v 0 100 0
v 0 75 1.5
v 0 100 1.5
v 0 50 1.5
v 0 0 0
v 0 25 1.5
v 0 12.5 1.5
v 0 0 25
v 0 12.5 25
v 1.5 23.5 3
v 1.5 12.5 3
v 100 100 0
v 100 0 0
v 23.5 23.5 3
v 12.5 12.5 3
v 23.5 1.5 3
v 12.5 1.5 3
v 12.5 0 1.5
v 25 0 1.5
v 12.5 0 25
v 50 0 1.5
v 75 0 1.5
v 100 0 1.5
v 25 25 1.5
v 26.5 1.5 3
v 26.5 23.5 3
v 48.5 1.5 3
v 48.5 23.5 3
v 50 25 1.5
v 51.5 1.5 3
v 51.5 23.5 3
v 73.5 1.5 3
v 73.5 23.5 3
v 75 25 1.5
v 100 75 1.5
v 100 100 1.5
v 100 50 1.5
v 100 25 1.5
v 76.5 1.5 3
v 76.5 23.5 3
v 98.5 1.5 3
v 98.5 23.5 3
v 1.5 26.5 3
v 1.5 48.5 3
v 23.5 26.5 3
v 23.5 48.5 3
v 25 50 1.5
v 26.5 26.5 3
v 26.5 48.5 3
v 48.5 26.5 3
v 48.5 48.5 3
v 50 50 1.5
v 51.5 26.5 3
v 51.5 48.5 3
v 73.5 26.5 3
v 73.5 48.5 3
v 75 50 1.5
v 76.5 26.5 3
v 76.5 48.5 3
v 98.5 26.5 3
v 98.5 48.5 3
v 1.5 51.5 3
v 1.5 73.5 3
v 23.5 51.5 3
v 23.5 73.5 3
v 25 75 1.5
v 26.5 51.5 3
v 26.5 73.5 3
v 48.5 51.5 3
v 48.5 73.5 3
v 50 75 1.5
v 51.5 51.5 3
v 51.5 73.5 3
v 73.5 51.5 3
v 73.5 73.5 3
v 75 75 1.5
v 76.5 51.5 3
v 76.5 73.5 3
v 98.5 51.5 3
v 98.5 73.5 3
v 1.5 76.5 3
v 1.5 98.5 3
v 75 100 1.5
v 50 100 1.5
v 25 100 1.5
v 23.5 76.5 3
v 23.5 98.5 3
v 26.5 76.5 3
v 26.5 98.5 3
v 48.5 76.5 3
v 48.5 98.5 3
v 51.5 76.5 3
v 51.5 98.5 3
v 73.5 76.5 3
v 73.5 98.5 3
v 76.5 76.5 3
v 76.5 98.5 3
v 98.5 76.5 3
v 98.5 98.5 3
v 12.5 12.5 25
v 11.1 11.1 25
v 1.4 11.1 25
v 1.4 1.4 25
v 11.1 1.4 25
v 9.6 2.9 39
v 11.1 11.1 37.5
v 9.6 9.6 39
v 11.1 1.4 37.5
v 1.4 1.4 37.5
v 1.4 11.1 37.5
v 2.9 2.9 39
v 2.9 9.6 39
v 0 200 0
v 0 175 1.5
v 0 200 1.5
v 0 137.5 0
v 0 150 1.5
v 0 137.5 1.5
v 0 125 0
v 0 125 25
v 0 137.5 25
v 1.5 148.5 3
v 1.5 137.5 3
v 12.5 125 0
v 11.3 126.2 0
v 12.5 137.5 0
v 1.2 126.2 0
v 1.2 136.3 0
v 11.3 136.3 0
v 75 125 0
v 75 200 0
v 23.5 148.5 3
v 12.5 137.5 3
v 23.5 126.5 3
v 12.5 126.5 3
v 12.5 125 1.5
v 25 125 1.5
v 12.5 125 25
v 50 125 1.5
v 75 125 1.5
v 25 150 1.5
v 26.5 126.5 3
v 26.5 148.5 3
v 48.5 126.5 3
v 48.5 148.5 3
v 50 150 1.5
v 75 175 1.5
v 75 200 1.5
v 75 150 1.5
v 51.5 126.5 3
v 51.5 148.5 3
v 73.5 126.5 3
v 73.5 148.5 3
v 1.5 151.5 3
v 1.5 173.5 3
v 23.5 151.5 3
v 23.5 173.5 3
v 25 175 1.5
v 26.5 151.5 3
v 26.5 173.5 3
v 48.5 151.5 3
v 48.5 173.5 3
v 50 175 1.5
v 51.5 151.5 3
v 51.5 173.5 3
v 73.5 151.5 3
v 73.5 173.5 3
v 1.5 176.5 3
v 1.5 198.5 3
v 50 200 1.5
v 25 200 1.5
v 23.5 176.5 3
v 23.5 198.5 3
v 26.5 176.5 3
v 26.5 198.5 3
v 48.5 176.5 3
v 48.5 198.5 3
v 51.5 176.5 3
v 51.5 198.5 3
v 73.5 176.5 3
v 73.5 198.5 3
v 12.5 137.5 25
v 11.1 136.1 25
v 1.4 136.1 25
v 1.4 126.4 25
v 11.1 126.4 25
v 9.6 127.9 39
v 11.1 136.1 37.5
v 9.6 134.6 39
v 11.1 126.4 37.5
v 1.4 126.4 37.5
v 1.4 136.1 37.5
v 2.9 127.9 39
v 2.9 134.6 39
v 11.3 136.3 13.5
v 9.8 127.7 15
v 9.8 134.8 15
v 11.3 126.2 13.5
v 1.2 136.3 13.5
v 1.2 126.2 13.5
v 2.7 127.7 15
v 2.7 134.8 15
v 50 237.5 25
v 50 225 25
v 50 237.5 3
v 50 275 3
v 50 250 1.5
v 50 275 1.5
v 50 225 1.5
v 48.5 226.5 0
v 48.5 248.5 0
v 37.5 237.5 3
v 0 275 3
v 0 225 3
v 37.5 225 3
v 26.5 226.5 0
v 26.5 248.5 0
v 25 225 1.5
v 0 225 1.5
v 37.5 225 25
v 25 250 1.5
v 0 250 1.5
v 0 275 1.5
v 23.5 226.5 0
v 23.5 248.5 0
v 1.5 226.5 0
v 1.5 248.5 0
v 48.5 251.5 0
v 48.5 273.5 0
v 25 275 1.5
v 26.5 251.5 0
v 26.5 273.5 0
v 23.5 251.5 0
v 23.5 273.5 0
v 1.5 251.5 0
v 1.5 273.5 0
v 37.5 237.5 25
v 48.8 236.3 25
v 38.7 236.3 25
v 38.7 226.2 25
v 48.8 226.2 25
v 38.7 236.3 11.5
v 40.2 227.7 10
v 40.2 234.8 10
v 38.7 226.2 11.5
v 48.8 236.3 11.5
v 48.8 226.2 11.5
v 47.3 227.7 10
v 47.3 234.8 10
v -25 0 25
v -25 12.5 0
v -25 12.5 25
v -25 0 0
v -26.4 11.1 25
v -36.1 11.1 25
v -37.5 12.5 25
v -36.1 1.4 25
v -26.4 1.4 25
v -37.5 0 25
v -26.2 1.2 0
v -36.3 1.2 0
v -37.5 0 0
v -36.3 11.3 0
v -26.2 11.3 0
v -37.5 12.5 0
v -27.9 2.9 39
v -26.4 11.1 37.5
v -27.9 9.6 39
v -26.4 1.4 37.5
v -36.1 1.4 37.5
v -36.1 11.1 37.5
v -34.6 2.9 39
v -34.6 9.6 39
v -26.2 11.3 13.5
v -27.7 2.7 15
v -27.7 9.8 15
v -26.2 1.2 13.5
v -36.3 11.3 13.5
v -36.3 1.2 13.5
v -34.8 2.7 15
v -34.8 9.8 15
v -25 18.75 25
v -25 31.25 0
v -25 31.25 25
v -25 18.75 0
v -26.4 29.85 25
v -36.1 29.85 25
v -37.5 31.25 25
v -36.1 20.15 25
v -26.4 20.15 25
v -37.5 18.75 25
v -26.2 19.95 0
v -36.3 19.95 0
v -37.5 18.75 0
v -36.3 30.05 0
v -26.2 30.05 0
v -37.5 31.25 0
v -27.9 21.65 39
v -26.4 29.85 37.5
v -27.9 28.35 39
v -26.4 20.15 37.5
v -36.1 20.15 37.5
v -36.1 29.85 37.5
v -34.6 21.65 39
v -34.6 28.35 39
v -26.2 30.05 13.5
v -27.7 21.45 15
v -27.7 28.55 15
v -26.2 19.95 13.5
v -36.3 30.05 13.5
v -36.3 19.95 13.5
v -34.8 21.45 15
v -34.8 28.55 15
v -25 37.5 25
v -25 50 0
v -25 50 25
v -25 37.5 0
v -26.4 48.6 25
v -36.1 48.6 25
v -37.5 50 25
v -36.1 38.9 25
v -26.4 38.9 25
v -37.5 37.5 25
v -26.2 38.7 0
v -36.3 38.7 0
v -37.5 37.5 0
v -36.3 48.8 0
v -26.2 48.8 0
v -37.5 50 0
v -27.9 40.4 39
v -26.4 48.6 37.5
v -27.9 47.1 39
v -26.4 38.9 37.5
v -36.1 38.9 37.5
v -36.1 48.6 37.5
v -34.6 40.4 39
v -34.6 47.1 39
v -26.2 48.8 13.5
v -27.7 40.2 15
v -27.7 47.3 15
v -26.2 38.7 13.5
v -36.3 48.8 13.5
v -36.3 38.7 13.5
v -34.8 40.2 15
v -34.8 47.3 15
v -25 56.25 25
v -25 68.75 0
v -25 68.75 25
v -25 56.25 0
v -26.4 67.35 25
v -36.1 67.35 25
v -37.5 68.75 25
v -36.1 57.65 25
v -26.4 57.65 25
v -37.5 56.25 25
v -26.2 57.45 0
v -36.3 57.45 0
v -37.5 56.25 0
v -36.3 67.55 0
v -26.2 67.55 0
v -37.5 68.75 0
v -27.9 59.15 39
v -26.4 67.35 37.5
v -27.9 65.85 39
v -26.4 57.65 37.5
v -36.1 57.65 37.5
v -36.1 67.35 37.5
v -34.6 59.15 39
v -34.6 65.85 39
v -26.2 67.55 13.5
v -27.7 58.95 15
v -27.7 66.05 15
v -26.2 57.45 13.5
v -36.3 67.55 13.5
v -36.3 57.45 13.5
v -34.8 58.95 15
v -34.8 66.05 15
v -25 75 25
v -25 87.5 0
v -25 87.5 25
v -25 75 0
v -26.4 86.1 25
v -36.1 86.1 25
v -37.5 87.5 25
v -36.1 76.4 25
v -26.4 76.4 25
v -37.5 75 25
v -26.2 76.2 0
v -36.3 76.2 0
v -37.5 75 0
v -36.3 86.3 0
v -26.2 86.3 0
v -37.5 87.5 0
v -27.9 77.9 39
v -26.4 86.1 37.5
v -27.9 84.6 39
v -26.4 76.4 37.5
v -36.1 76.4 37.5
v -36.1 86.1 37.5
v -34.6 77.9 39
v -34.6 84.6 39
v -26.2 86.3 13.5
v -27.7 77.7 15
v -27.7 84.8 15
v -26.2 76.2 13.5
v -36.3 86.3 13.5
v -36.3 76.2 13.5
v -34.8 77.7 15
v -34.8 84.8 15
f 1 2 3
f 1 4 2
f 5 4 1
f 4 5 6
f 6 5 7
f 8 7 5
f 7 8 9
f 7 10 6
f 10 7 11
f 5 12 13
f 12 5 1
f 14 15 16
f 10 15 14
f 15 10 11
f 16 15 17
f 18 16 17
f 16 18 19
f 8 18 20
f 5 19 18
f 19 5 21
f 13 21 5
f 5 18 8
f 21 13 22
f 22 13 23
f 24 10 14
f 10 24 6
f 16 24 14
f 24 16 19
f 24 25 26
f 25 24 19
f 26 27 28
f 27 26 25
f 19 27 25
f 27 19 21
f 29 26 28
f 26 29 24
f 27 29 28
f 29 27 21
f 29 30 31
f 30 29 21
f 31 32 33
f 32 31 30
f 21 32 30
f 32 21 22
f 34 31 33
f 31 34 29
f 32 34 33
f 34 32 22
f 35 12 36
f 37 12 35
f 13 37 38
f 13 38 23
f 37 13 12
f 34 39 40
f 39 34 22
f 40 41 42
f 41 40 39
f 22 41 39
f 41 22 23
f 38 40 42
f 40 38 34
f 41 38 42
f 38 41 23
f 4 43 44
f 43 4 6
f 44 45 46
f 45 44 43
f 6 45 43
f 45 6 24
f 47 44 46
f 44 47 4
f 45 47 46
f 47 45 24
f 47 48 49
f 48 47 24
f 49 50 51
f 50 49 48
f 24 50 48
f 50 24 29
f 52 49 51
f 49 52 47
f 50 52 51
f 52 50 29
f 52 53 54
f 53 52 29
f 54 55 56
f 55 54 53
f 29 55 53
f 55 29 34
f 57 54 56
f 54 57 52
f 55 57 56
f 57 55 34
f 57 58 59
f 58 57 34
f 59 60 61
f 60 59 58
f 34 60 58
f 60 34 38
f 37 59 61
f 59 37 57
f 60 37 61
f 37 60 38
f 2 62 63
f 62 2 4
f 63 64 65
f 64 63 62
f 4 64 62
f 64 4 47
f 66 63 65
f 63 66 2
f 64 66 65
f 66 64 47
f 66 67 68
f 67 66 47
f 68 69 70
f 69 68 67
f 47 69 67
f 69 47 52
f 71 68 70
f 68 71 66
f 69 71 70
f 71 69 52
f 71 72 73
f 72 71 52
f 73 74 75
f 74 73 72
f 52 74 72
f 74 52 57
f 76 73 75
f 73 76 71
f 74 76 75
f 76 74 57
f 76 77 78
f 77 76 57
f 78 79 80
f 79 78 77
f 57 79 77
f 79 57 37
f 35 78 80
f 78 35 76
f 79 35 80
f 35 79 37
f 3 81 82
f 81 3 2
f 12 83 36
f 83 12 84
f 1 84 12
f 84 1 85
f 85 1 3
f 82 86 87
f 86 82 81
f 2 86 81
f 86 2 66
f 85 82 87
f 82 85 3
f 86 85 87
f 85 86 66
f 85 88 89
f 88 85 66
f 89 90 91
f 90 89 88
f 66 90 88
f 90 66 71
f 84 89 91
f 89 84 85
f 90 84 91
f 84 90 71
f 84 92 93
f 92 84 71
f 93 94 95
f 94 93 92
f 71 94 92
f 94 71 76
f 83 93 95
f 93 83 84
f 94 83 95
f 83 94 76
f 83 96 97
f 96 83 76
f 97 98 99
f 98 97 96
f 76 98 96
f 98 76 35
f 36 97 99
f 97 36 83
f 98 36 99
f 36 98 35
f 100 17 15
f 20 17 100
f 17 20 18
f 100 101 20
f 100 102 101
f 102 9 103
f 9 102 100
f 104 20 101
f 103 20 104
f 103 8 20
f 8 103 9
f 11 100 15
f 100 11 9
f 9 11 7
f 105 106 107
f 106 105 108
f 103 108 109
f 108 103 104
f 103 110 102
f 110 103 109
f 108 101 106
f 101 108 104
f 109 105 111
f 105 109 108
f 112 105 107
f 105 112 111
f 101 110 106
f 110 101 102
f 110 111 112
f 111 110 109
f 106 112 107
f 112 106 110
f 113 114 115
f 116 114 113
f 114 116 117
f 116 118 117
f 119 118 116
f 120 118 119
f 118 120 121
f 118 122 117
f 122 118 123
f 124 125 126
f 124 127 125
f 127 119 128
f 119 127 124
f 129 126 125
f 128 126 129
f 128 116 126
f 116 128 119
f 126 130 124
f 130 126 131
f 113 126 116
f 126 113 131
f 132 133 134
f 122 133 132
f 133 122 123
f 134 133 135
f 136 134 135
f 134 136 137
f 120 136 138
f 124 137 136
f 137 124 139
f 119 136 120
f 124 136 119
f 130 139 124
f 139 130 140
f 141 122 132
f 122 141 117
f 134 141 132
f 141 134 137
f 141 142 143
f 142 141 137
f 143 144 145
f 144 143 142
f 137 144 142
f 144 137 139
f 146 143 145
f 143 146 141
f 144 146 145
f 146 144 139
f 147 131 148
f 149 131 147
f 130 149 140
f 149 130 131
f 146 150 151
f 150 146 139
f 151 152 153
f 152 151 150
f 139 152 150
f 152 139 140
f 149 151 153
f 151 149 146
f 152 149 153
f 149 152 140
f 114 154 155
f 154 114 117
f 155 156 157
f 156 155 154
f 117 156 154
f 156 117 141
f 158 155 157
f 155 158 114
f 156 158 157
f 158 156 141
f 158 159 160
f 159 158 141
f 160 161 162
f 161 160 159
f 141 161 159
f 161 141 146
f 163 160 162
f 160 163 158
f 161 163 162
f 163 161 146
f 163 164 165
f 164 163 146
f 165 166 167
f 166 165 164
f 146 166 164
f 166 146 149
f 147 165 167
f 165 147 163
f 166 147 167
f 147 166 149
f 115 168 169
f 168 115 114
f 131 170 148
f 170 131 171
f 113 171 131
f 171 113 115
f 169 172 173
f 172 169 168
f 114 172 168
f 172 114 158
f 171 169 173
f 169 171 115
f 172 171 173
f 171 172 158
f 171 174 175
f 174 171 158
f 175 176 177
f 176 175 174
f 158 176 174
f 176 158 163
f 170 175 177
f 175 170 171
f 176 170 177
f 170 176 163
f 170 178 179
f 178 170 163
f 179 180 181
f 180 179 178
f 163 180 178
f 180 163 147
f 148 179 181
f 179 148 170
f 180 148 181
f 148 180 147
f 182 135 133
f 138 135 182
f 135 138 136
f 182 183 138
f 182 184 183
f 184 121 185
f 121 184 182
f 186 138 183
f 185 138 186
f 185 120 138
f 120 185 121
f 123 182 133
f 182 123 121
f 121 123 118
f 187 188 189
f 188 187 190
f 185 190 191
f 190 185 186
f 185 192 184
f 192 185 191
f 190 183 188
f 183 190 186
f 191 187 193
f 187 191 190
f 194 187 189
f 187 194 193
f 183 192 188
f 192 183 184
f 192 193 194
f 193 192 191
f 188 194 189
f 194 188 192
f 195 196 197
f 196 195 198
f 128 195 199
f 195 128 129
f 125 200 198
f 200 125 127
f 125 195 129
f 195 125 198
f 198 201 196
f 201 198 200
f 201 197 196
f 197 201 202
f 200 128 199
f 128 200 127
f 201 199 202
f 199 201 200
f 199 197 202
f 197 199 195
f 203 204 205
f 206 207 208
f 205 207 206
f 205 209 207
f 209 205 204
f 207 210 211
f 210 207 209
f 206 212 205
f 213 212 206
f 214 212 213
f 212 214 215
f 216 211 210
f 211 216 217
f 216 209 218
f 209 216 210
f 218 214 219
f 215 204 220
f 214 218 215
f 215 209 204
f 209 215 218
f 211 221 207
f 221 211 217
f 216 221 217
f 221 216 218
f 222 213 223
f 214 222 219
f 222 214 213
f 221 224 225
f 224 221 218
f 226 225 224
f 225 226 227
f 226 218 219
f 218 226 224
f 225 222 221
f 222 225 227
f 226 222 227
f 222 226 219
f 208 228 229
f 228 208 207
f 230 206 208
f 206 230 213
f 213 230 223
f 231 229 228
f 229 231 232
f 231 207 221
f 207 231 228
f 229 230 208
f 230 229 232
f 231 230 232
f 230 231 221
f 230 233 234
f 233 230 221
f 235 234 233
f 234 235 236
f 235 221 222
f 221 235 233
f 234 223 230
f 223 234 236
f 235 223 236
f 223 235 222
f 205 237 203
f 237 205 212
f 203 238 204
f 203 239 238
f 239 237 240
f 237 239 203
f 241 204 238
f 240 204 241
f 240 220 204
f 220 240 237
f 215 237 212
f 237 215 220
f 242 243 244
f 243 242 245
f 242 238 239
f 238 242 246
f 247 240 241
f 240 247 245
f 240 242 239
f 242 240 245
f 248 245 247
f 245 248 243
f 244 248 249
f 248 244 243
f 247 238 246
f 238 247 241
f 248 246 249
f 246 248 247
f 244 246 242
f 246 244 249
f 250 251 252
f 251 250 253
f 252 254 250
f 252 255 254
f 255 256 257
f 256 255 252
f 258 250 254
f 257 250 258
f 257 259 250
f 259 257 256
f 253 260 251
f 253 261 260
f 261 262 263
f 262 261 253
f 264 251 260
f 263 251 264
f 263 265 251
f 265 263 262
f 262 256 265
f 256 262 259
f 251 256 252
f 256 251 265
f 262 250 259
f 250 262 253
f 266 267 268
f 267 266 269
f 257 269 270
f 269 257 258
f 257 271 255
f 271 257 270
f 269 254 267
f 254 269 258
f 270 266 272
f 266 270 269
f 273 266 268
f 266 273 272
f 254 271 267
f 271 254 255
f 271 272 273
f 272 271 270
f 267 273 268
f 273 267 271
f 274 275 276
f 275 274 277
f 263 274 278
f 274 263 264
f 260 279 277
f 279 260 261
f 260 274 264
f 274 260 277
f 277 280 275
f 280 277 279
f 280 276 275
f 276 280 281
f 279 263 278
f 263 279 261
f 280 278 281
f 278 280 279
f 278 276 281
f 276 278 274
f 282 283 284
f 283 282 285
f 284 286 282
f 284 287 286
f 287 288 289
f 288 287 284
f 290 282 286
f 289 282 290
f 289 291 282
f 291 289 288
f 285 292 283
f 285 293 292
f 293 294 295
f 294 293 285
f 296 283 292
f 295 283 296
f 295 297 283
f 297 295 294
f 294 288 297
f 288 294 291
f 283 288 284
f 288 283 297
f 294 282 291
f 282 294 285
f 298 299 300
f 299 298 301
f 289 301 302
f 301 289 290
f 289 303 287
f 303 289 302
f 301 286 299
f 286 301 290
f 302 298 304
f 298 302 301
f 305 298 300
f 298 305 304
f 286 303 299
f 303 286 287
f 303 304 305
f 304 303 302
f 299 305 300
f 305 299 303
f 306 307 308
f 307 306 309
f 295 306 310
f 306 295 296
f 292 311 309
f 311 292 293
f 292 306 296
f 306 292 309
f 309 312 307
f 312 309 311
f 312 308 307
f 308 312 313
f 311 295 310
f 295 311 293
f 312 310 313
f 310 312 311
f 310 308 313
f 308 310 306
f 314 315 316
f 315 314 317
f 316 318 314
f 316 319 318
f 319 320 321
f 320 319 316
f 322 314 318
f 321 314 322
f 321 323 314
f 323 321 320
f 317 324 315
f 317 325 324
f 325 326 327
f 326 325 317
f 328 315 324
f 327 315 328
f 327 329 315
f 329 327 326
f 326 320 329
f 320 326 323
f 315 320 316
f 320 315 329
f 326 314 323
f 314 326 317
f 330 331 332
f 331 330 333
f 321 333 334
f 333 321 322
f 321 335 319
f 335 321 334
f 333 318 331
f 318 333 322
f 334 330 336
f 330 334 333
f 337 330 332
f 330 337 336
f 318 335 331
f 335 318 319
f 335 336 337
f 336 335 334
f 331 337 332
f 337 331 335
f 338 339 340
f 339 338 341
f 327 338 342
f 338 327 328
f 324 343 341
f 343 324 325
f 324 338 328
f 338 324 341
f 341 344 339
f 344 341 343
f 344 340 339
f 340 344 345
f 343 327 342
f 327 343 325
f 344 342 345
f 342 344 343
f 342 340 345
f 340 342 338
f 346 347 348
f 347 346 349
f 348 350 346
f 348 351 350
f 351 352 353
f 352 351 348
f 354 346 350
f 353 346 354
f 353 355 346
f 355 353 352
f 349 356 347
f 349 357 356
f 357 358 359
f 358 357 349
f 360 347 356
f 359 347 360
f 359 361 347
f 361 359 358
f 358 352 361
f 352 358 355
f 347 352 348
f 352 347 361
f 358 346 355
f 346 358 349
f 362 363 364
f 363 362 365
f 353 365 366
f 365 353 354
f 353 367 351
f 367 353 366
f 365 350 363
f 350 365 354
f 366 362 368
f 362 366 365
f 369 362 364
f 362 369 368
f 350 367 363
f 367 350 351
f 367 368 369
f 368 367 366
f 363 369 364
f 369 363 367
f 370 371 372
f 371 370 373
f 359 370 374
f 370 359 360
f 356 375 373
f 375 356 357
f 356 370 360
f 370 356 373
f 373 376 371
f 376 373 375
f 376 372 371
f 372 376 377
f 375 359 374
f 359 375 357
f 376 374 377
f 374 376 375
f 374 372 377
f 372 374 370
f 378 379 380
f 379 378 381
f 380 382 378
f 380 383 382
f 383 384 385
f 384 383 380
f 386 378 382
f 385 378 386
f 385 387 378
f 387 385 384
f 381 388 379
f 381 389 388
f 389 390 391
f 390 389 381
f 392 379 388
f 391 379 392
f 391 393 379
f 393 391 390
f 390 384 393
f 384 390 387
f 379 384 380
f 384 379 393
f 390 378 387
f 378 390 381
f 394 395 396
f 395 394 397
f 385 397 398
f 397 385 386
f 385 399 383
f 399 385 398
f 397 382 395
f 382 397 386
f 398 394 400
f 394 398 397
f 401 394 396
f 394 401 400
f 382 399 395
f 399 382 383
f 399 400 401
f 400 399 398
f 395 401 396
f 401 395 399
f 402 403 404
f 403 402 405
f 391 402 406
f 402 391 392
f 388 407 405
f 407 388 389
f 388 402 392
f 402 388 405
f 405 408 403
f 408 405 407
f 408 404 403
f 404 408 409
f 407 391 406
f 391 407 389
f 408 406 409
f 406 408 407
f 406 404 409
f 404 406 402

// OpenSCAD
// Flying Combat Platform for Tabletop RPGs
// DMNC, Version 0.8, 14.12.2018

// Variables

_widthSquare=25;        // Square Length
_thickness=3;           // Plate Thickness
_sizeBaseX=4;           // Base platform, number of squares in a row
_sizeBaseY=4;           // Base platform, number of rows
_sizeMiddleX=3;         // Middle platform, number of squares in a row
_sizeMiddleY=3;         // Middle platform, number of rows
_sizeTopX=2;            // Top platform, number of squares in a row
_sizeTopY=2;            // Top platform, number of rows
_flippedTop=1;          // [0:false, 1:true]
_chamfer=50;            //Chamfer around Top-Side of Square
_tolerance=0.2;         // Tolerance for connecting pieces
_connectorHeight=40;    // Height of connecting pieces
_connectorPinHeight=15; // Height of pins on connecting pieces
_widthConnector=12.5;   // Width of connecting pieces
_connectorThickness=1.2;// Perimeter thickness of connecting pieces
_numberOfPieces=5;      // Number of Connecting Pieces

//Calculate Chamfer Size
_chamferSize=(_thickness*_chamfer)/100;

//Generate one Square
module oneSquare() {
    hull() {
        cube(size=[_widthSquare,_widthSquare,_thickness-_chamferSize]);
        translate([_chamferSize,_chamferSize,0])
        cube(size=[_widthSquare-2*_chamferSize,_widthSquare-2*_chamferSize,_thickness]);
    }
}

//Generate defaultConnector
module defaultConnectorTemp(w=_widthConnector,z1=_connectorHeight,z2=_connectorPinHeight,t=0,ct=_connectorThickness, bt=0) union(){
    
    cube(size=[w,w,z1-z2]);
    hull() {
        translate([ct+t,ct+t,0])
        cube(size=[w-2*(ct+t),w-2*(ct+t),z1-_chamferSize-bt]);
        translate([ct+t+_chamferSize,ct+t+_chamferSize,0])
        cube(size=[w-2*ct-2*t-2*_chamferSize,w-2*ct-2*t-2*_chamferSize,z1-bt]);
    }
}

module defaultConnector() difference() {
    defaultConnectorTemp(t=_tolerance, bt=5*_tolerance);
    translate([0,0,-_connectorHeight+_connectorPinHeight]) defaultConnectorTemp(); 
}

//Generate baseConnector
module baseConnector(w=_widthConnector,z1=_connectorHeight,z2=_connectorPinHeight,t=0,ct=_connectorThickness, bt=0) union() {
    
    /*cube(size=[w,w,z1-z2]);
    hull() {
        translate([ct+t,ct+t,0])
        cube(size=[w-2*ct-t,w-2*ct-t,z1-_chamferSize]);
        translate([ct+t+_chamferSize,ct+t+_chamferSize,0])
        cube(size=[w-2*ct-t-2*_chamferSize,w-2*ct-t-2*_chamferSize,z1]);
    }*/
    defaultConnectorTemp(w,z1,z2,t,ct,bt);
}

//Generate topConnector
module topConnector(w=_widthConnector,z1=_connectorHeight,z2=_connectorPinHeight,t=_tolerance,ct=_connectorThickness) {
    hull() {
        cube(size=[w,w,z1-z2-_chamferSize]);
        translate([_chamferSize,_chamferSize,0])
        cube(size=[w-2*_chamferSize,w-2*_chamferSize,z1-z2]);
    }
}

//Generate rows of squares
module baseOneRow(x=_sizeBaseX) {
    for(i=[1:x])
    translate((i-1)*[_widthSquare,0,0]) oneSquare();
}

module middleOneRow(x=_sizeMiddleX) {
    for(i=[1:x])
    translate((i-1)*[_widthSquare,0,0]) oneSquare();
}

module topOneRow(x=_sizeTopX) {
    for(i=[1:x])
    translate((i-1)*[_widthSquare,0,0]) oneSquare();
}

//Generate platforms
module basePlatform(y=_sizeBaseY) {
    if (_sizeBaseX == 0 || _sizeBaseY == 0) { }
    else {
    for(i=[1:y]) translate([0,(i-1)*_widthSquare,0]) baseOneRow();
    translate([0,0,0]) baseConnector(t=_tolerance, bt=5*_tolerance);
    }
}

module middlePlatformTemp(y=_sizeMiddleY) union(){
    translate([0,(_sizeBaseY+1)*_widthSquare,0])
    for(i=[1:y]) translate([0,(i-1)*_widthSquare,0]) middleOneRow();
    translate([0,(_sizeBaseY+1)*_widthSquare,0]) baseConnector(t=_tolerance, bt=5*_tolerance);
}

module middlePlatform(x=_sizeMiddleX) difference(){
    middlePlatformTemp();
    translate([0,(_sizeBaseY+1)*_widthSquare,-_connectorHeight+_connectorPinHeight]) baseConnector(); 
}

module middlePlatformCheck() {
        if (_sizeMiddleX == 0 || _sizeMiddleY == 0) { }
    else {
        middlePlatform();
    }
}

module topPlatformTemp(y=_sizeTopY) union(){
    translate([0,(_sizeBaseY+1+_sizeMiddleY+1)*_widthSquare,0])
    for(i=[1:y]) translate([0,(i-1)*_widthSquare,0]) topOneRow();
    translate([0,(_sizeBaseY+1+_sizeMiddleY+1)*_widthSquare,0]) topConnector();
}

module topPlatformFlippedTemp(y=_sizeTopY) union(){
    translate([0,(_sizeBaseY+1+_sizeMiddleY+1)*_widthSquare,0])
    for(i=[1:y]) translate([0,(i-1)*_widthSquare,0]) topOneRow();
    translate([0,(_sizeBaseY+1+_sizeMiddleY+1)*_widthSquare,-_connectorHeight+_connectorPinHeight+_thickness]) topConnector();
}

module topPlatformDefault(y=_sizeTopY) difference(){
    topPlatformTemp();
    translate([0,(_sizeBaseY+1+_sizeMiddleY+1)*_widthSquare,-_connectorHeight+_connectorPinHeight]) baseConnector();
}

module topPlatformFlipped(y=_sizeTopY) difference(){
    topPlatformFlippedTemp();
    translate([0,(_sizeBaseY+1+_sizeMiddleY+1)*_widthSquare,-_connectorHeight+_connectorPinHeight-_connectorHeight+_connectorPinHeight+_thickness]) baseConnector();
}

module topPlatformVariantPicker(y=_sizeTopY) difference(){
    
        
    if (_flippedTop)
    {
        if (_sizeTopX == 0 || _sizeTopY == 0) { }
        else {
            rotate([0,180,0])
            translate([(-(_sizeTopX)*_widthSquare),0,-_thickness])
            topPlatformFlipped();
        }
    }
    else
    {   
        if (_sizeTopX == 0 || _sizeTopY == 0) { }
        else {
            topPlatformDefault();
        }
    }
}

module connectingPieces(n=_numberOfPieces) {
    translate([-_widthConnector-_widthSquare,0,0])
    for(i=[1:n]) translate([0,(i-1)*(_widthConnector*1.5),0]) defaultConnector();
}

//Generate Elements
basePlatform();
middlePlatformCheck();
topPlatformVariantPicker();
connectingPieces();
